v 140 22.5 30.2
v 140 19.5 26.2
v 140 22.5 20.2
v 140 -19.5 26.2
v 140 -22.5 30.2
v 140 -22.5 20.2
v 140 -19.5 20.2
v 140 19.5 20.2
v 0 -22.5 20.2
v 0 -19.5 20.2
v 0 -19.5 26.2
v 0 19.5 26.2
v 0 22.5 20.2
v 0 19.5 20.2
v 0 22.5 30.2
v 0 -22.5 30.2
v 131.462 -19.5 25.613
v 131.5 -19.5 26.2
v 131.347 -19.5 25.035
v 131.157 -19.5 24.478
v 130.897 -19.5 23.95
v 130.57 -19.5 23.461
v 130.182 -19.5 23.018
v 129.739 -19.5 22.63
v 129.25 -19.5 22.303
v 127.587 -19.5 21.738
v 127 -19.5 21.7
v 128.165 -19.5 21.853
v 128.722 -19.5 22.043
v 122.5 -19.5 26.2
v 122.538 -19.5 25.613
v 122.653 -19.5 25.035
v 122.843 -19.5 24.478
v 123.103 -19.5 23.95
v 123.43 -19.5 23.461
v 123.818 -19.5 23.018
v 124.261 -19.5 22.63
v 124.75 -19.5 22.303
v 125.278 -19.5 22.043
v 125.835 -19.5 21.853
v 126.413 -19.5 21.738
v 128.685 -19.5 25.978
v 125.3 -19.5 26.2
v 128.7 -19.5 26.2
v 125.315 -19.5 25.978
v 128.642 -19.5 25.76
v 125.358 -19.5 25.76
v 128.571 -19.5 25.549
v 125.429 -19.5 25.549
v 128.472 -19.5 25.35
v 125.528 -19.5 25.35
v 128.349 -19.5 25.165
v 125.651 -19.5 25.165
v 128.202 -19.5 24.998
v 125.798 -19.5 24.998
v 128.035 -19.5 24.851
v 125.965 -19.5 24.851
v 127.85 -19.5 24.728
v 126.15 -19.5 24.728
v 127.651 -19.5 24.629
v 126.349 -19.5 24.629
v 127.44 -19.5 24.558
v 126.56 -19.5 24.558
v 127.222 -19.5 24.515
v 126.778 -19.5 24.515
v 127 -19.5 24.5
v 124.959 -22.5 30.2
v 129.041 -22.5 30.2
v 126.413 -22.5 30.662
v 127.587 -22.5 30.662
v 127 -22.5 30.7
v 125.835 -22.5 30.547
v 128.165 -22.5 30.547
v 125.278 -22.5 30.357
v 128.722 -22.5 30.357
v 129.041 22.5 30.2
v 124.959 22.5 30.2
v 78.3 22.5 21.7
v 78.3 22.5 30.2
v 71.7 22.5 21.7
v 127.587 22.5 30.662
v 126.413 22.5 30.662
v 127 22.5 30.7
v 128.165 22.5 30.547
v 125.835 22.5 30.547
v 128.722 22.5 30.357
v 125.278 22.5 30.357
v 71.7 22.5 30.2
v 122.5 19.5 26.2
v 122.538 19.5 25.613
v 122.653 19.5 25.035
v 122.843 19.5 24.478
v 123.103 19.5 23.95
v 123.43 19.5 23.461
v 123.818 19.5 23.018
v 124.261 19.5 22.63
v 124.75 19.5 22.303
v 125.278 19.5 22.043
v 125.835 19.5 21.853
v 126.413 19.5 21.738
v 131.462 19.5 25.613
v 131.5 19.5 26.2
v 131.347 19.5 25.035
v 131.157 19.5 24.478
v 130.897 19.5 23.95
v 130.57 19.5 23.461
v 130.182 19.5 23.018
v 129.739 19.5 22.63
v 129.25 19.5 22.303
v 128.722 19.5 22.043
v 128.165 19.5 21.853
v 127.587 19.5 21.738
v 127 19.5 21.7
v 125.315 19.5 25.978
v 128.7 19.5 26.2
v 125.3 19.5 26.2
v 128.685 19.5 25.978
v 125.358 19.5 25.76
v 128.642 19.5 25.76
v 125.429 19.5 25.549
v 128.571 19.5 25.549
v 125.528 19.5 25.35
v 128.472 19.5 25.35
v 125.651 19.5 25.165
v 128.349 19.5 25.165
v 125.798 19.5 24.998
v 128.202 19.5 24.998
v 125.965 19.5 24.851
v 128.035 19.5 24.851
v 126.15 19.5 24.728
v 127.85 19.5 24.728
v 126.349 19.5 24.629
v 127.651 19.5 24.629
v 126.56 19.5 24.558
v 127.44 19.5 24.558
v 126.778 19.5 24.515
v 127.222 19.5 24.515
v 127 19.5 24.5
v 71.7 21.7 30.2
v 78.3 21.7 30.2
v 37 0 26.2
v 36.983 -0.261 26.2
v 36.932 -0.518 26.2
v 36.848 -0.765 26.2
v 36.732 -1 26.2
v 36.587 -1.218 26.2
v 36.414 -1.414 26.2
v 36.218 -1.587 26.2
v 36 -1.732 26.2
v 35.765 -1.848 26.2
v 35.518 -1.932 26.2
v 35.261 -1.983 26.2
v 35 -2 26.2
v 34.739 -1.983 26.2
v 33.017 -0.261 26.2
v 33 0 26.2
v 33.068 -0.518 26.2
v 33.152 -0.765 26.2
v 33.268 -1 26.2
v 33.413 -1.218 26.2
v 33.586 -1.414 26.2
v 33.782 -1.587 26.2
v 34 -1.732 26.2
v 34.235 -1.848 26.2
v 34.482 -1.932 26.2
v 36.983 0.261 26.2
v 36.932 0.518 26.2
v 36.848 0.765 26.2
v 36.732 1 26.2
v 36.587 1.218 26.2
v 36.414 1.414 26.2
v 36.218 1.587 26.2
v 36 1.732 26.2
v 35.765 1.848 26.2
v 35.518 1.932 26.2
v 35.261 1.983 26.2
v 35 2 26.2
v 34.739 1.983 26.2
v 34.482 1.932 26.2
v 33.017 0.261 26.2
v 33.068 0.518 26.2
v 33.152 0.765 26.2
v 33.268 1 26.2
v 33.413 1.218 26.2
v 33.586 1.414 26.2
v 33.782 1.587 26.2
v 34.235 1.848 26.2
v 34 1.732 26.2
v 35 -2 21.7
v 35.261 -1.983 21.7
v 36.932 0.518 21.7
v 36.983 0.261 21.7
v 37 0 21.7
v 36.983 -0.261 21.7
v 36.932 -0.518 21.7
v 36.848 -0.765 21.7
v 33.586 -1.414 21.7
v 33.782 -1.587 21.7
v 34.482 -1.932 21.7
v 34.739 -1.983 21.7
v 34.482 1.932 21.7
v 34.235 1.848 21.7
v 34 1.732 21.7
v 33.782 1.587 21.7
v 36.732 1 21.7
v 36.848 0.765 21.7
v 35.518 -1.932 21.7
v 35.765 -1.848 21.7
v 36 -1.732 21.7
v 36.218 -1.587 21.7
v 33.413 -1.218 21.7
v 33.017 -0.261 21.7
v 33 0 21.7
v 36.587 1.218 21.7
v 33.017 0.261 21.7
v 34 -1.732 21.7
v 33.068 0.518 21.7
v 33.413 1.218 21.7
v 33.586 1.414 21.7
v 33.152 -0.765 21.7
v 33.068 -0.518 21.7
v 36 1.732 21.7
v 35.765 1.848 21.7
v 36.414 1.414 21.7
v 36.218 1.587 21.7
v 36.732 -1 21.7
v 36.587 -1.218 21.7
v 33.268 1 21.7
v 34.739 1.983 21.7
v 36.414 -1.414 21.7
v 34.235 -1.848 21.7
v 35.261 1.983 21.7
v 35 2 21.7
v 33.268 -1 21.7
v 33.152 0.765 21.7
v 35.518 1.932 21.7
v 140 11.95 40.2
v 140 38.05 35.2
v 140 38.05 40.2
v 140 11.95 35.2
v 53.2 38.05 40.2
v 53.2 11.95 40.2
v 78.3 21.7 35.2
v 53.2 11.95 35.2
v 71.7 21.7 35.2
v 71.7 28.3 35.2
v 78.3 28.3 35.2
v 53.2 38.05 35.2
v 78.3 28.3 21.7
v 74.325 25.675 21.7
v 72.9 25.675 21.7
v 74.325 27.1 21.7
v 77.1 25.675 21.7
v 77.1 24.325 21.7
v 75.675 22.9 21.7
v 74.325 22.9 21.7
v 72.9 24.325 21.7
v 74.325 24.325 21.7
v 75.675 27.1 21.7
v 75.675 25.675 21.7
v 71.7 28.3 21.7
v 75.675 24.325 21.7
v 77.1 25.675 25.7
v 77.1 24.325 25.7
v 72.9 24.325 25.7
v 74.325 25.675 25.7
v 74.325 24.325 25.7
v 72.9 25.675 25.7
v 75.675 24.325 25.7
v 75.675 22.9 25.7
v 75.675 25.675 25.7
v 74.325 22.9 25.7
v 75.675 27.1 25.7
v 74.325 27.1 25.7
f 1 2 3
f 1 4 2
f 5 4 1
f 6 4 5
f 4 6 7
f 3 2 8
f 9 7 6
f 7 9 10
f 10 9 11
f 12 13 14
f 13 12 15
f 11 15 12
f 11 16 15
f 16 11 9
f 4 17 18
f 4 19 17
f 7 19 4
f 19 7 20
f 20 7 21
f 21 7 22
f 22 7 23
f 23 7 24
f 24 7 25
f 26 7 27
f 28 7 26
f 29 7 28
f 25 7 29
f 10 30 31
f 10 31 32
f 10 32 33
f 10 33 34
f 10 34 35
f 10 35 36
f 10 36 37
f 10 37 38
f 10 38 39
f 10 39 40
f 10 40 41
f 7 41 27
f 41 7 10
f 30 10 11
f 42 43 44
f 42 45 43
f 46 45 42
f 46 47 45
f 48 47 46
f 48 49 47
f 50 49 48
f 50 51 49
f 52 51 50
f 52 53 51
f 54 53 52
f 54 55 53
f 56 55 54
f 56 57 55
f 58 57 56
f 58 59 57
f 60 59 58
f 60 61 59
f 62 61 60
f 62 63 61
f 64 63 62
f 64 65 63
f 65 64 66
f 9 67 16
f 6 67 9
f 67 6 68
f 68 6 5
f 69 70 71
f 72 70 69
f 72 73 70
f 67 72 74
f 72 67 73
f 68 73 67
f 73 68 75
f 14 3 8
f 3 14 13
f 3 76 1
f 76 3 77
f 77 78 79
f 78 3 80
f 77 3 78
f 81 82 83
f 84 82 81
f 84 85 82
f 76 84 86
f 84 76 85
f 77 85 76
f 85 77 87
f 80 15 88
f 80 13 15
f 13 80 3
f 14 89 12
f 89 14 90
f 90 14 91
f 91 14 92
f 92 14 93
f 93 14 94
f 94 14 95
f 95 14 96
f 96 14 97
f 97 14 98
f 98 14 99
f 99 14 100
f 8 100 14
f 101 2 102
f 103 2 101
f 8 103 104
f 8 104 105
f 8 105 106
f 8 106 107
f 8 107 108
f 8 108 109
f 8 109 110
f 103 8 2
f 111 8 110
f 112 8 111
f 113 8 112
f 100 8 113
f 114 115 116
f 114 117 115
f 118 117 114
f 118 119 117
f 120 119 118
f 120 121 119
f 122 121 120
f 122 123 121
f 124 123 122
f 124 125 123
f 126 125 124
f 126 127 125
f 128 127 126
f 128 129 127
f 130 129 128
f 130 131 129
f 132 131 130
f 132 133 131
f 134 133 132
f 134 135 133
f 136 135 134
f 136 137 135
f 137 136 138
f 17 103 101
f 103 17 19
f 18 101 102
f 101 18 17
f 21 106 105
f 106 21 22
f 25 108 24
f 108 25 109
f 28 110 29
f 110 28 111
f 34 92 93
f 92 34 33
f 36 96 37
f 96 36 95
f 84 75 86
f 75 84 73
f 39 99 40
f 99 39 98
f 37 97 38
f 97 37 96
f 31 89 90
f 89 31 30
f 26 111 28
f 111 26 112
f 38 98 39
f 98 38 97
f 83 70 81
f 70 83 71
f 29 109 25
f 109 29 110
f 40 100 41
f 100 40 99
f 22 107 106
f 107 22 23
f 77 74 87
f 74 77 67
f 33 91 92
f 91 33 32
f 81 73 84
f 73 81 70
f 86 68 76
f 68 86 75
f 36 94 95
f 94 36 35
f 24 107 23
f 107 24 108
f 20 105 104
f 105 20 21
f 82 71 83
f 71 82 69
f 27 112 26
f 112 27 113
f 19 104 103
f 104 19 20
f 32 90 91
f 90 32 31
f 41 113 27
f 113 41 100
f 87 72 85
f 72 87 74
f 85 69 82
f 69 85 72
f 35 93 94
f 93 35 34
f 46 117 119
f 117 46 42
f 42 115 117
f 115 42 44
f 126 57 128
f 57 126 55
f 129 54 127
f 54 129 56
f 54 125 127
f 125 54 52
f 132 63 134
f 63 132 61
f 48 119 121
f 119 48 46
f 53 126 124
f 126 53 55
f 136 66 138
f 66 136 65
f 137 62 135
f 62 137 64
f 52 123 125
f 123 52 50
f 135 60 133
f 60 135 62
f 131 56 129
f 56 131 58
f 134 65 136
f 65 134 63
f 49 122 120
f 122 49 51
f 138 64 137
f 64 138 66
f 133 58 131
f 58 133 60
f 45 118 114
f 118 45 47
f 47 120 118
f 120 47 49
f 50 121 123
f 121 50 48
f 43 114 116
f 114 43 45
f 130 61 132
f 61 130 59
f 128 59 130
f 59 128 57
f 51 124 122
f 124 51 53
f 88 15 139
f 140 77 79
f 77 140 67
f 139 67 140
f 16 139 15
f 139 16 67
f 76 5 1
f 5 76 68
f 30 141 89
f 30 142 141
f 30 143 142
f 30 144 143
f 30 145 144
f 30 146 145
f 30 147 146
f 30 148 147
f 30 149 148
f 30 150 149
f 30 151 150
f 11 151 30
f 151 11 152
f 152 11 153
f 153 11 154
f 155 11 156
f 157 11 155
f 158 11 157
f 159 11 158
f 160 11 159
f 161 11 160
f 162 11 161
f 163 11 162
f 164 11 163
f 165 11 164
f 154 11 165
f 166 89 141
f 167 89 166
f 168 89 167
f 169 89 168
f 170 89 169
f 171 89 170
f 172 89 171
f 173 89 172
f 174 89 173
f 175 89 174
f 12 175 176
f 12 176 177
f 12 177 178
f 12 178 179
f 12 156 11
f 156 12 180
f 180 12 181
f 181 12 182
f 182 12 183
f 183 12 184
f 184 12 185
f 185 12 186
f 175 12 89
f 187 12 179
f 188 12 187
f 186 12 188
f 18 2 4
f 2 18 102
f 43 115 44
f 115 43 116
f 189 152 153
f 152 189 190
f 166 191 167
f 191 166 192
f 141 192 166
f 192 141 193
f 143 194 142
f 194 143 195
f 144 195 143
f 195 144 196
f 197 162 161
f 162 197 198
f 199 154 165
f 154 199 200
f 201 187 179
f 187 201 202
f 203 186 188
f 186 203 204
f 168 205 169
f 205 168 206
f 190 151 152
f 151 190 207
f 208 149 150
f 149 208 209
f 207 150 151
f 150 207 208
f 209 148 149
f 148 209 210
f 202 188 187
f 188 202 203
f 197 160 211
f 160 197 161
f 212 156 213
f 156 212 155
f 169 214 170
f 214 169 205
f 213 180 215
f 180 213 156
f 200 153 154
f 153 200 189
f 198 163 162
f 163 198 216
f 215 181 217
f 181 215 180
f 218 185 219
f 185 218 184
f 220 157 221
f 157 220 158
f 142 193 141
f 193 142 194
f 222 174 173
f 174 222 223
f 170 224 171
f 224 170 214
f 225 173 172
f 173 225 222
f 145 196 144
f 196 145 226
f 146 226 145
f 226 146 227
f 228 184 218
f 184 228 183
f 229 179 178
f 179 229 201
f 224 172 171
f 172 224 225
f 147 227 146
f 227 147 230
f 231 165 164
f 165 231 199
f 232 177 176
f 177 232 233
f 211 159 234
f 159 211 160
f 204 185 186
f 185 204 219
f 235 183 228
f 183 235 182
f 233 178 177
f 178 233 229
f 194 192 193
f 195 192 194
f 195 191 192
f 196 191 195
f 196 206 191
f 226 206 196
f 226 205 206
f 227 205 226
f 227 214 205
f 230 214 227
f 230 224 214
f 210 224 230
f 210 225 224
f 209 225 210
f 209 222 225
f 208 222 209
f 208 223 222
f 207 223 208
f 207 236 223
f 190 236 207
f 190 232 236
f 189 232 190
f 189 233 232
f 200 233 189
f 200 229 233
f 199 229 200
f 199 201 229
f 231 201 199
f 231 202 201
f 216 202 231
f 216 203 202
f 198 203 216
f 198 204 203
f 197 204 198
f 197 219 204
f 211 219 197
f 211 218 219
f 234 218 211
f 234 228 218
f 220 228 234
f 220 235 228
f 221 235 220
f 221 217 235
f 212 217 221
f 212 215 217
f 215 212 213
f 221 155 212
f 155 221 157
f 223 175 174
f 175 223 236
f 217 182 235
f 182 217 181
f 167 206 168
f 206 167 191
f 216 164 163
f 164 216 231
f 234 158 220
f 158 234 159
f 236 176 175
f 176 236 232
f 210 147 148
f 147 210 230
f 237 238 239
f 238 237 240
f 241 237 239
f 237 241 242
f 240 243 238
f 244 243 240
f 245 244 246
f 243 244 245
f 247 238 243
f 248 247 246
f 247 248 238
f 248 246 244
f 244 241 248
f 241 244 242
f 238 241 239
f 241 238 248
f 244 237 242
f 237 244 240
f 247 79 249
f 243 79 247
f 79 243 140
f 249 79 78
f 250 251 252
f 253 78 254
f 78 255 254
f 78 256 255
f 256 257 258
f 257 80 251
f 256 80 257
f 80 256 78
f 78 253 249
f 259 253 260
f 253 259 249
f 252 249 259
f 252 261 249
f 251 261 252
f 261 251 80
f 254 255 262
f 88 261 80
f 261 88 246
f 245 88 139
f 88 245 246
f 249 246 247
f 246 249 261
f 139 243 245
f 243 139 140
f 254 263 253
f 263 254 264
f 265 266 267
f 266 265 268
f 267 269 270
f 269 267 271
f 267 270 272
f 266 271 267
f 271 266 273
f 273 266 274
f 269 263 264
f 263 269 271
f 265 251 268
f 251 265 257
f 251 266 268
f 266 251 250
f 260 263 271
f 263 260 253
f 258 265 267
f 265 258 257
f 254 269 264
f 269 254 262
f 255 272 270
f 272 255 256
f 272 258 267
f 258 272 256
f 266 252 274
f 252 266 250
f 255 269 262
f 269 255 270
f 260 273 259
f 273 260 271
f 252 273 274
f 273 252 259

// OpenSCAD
// =====================================================================
// piano_keys.scad — the moving parts, PRINTED IN BOTH ROUTES
// =====================================================================
// Everything in this file is 3D printed and is needed whichever base you
// build. Nothing here is laser-cut.
//
//   mode "key"    key lever  x11
//   mode "black"  black key  x7
//
// The base comes from ONE of:
//   piano_base_printed.scad   all-printed route
//   piano_base_laser.scad     laser-cut route
//
// Shared dimensions live in piano_params.scad — edit them there.
// See ../TECHSPARK_PLAN.md for the full parts manifest.
//
// MECHANISM (side view, front = left):
//
//        finger presses here (contact_x)
//                |
//   ___________  v  ______________________ () <- rear pin hinge
//  |  key cap (lever, pivots at rear)      |
//  |______________________________________|
//                |plunger|
//                v
//             [MX switch] <- its own spring holds the key up and returns it
//  ============= base ====================
//
// The key RESTS on the switch stem. The finger drives the cap down; the stem
// actuates, and shortly after the cap lands on the base's stop shoulders.
// Those shoulders — not the switch — absorb the 362-520 gf overshoot.
// There is NO separate return spring and no up-stop: the MX spring does both.
//
// COORDINATES: x along the key (0 = front, +x = rear/hinge); y across the
// width (0 = centre); z up (0 = board underside).
// =====================================================================

include <piano_params.scad>

$fn = 48;

// =====================================================================
// Key lever (the moving key cap). Printing it upside-down is easiest.
// =====================================================================
// `idx` is the white-key index 0..10. It decides which sides get notched to
// clear the neighbouring black keys' switches. Pass -1 for an un-notched key.
module key_lever(idx = -1) {
    difference() {
        union() {
            // top plate
            translate([0, -key_w/2, under_rest]) cube([key_len, key_w, cap_th]);
            // side rails (cosmetic skirts) — INSIDE the key width so they clear
            // the hinge posts and the neighbouring key
            for (s = [-1, 1])
                translate([0, (s > 0) ? (key_w/2 - side_rail) : -key_w/2, under_rest - 6])
                    cube([key_len, side_rail, 6 + 0.1]);
            // rear hinge knuckle, centred in y, pin axis along Y
            translate([pivot_x, 0, pivot_z]) knuckle();
            // plunger at contact_x: presses the MX stem (no spring — MX returns it)
            translate([contact_x, 0, 0]) plunger();
        }
        // Notch the rear of the key wherever a black key sits beside it, so its
        // switch has room. Real piano white keys are shaped the same way, and
        // for the same reason. The notch stops at blk_notch_x1 so the hinge
        // knuckle keeps its full width.
        if (is_black(idx))     notch( 1);
        if (is_black(idx - 1)) notch(-1);
    }
}

module notch(side) {
    y0 = (side > 0) ? (key_w/2 - blk_notch) : -(key_w/2);
    translate([blk_notch_x0, y0, under_rest - 8])
        cube([blk_notch_x1 - blk_notch_x0, blk_notch, cap_th + 10]);
}

// Hinge knuckle. Origin is the PIN CENTRE, so it is called with
// translate([pivot_x, 0, pivot_z]). A bar lying along Y with the pin bore
// through it, merging into the cap above. It does NOT reach down to the base —
// the key has to swing freely. Its width (knuckle_wid) is what stops the key
// sliding sideways along the pin.
module knuckle() {
    difference() {
        translate([0, -knuckle_wid/2, 0])
            rotate([-90, 0, 0]) cylinder(h = knuckle_wid, d = knuckle_boss_d);
        translate([0, -knuckle_wid/2 - 1, 0])
            rotate([-90, 0, 0]) cylinder(h = knuckle_wid + 2, d = pin_d);
    }
}

module plunger() {
    // Stubby post hanging from the cap underside that pushes the MX stem down.
    // It passes between the base's stop shoulders; the CAP UNDERSIDE is what
    // lands on them, so the switch never takes the overshoot.
    tip_d = 4;
    translate([0, 0, under_rest - plunger_len])
        cylinder(h = plunger_len, d = tip_d);
}

// =====================================================================
// Black key (decorative riser, no switch). Sits at a white-key boundary:
// a thin web drops into the base's slot/groove and is glued; the cap
// overhangs both neighbouring white keys, black_rise above their tops.
// White keys only travel DOWN, so the overhang never collides.
// Print flat on its side for strength along the web.
// =====================================================================
// A SWITCHED black key: a keycap on a post that pushes straight onto an MX
// stem, exactly like a keyboard keycap. No hinge, no glue, no return spring —
// the switch supplies the travel and the spring.
//
// It travels straight down while the white keys pivot. Slightly different feel,
// but the black keys are never pressed by the robot, and a lever here would
// collide with the hinge brackets that share the same 5 mm gap.
module black_key() {
    cap_under = black_top_z - blk_cap_th;
    post_w    = mx_mount_cross + 2.4;      // socket plus wall
    difference() {
        union() {
            // cap
            translate([key_len - black_len, -black_w/2, cap_under])
                cube([black_len, black_w, blk_cap_th]);
            // post down to the switch stem, centred on blk_switch_x
            translate([blk_switch_x - post_w/2, -post_w/2, stem_top_z])
                cube([post_w, post_w, cap_under - stem_top_z + 0.1]);
        }
        // MX cross socket in the underside of the post
        translate([blk_switch_x, 0, stem_top_z - 0.1]) mx_mount();
    }
}

// The + shaped recess an MX stem plugs into.
module mx_mount() {
    for (r = [0, 90])
        rotate([0, 0, r])
            translate([-mx_mount_cross/2, -mx_mount_th/2, 0])
                cube([mx_mount_cross, mx_mount_th, mx_mount_depth + 0.1]);
}

// =====================================================================
// Render selector
// =====================================================================
// "key"    one key lever   (print 11)
// "black"  one black key   (print 7)
// "pair"   both together, to check the black key clears the white key
mode = "pair";

if      (mode == "key")   key_lever();
else if (mode == "black") black_key();
else if (mode == "pair") {
    color("white") key_lever();
    color("black") translate([0, pitch/2, 0]) black_key();
}
